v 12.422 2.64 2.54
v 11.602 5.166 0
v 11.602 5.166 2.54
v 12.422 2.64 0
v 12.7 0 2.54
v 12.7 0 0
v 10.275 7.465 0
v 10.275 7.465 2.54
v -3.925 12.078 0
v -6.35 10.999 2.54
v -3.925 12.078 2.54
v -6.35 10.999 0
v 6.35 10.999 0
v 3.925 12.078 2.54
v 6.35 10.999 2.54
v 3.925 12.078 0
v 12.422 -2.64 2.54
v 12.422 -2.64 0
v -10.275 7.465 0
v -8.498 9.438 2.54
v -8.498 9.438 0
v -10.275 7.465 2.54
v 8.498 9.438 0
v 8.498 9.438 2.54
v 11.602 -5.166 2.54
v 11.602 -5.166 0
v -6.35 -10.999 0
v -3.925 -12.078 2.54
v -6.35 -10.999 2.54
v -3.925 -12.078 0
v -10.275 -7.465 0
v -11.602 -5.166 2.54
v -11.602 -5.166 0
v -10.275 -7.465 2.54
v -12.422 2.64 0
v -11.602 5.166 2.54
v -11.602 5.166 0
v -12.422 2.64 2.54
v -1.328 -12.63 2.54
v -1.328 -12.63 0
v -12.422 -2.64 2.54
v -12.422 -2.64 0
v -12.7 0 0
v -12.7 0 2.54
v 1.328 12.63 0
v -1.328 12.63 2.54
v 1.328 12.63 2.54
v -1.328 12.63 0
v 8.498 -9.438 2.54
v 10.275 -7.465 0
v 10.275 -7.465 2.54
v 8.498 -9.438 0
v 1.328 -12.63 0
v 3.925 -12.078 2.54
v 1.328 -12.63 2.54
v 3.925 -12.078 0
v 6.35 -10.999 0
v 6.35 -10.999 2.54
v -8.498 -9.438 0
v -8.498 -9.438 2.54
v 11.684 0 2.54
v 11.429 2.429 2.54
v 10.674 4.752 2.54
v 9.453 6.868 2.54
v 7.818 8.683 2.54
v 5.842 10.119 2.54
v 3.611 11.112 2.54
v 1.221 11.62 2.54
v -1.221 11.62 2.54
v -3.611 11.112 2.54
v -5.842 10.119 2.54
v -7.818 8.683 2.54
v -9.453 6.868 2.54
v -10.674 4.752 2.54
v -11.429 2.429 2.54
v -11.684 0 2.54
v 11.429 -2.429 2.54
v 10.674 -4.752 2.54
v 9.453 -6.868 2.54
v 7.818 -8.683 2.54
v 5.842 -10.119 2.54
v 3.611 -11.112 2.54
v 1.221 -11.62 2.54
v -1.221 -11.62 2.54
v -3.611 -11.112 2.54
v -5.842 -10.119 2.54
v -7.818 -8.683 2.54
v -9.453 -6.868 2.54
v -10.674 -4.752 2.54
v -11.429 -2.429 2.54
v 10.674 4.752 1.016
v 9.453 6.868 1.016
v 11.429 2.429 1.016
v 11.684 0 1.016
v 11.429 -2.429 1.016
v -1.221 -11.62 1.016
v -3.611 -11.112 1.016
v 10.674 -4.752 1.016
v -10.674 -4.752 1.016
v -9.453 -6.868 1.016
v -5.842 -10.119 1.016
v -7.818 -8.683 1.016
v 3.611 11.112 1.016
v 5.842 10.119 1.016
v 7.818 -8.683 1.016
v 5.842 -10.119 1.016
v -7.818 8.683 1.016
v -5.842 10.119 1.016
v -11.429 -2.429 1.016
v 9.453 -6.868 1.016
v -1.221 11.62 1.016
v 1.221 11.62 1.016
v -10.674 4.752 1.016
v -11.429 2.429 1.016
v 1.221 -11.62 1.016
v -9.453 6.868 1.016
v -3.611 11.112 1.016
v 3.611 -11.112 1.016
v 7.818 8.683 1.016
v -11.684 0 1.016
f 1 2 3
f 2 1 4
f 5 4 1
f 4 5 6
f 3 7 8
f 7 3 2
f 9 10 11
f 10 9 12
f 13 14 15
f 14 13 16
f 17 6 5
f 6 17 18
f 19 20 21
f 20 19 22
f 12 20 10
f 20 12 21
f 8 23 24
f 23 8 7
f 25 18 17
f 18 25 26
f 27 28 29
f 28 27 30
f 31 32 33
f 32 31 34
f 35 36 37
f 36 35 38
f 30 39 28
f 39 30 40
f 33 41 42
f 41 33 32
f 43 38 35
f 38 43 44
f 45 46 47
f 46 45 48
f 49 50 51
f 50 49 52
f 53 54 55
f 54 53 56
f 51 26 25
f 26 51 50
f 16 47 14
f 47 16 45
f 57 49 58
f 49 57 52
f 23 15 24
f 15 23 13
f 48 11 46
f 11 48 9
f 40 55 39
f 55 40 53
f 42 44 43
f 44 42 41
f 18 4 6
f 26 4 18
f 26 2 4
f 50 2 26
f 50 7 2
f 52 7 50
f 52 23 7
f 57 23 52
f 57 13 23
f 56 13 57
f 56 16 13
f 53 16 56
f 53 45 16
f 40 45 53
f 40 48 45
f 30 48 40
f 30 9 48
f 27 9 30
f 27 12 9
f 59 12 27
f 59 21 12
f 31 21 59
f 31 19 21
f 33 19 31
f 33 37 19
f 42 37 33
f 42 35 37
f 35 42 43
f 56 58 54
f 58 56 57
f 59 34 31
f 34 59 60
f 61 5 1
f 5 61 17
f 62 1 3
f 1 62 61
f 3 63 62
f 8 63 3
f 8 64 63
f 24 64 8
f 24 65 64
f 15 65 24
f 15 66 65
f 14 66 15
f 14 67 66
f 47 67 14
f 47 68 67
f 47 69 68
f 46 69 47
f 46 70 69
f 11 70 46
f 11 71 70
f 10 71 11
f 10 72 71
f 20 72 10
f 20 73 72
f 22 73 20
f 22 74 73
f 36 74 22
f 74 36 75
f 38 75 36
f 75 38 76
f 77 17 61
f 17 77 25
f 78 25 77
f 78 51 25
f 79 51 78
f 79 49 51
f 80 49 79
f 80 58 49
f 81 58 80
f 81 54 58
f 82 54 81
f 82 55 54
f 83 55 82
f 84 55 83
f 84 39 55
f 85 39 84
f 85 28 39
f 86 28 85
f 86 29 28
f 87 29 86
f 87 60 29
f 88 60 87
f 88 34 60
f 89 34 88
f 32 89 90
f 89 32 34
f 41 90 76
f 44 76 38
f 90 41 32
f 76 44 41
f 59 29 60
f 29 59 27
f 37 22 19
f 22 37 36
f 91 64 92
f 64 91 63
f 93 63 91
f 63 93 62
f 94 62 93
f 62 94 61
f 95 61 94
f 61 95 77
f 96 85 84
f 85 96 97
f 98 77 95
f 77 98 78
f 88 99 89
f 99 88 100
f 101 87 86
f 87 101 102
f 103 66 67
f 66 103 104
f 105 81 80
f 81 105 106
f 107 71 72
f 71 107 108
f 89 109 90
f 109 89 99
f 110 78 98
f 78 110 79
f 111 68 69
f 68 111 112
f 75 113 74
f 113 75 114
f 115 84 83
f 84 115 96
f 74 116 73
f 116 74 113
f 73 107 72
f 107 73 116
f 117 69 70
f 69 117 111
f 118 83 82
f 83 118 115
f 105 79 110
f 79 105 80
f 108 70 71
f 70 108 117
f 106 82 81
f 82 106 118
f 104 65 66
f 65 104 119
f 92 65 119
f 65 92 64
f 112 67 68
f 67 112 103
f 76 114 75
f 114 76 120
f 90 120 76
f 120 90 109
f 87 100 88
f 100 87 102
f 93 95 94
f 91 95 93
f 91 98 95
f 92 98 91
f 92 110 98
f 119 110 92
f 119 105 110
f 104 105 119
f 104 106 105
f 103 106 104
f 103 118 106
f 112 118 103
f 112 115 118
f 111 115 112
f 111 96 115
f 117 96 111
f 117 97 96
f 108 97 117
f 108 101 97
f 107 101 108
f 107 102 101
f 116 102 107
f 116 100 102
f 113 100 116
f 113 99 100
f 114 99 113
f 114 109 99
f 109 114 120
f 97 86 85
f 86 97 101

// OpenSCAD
// OSHW Logo Generator

// render_part=1; // gear_tooth_2d()
// render_part=2; // oshw_logo_2d()
// render_part=3; // 4mm shelled oshw_logo_2d()
render_part=4; // 1 inch OSHW Coin

module gear_tooth_2d(scale=1.0) {
  scale([scale,scale]) polygon(
    points=[ [0,25.0], [90.0,12.0], [90.0,-12.0], [0,-25.0] ]
    , paths=[ [0,1,2,3] ]
    );
}

if(render_part==1) {
  echo("Rendering gear_tooth_2d()...");
  gear_tooth_2d();
}

module oshw_logo_2d(scale=1.0) {
  scale([scale,scale]) rotate(-45-90) {
    difference() {
      union() {
	  circle(r=70.0);
	  for(i=[1:7]) assign(rotAngle=360*i/8+45) rotate(rotAngle) {
	    gear_tooth_2d();
	  }
	}
	circle(r=25.0);
	intersection() {
	  rotate(-20) square(size=[100,100]);
	  rotate(20)  square(size=[100,100]);
	}
    }
  }
}

if(render_part==2) {
  echo("Rendering gear_tooth_2d()...");
  oshw_logo_2d();
}

module shell_2d(width=2.0,steps=8,scale_x=1.0,scale_y=1.0) {
  union() {
    for(i=[0:steps-1]) assign(rotAngle=360*i/steps) difference() {
      child(0);
      translate([scale_x*width*cos(rotAngle),scale_y*width*sin(rotAngle)]) 
	  child(0);
    }
  }
}

if(render_part==3) {
  // Note: Don't perform shell operation on oshw_logo_2d() directly. It's rather inefficient.
  echo("Rendering 4mm shelled gear_tooth_2d()...");
  shell_2d(width=4.0,steps=16,scale_x=1.0,scale_y=1.0)
//    oshw_logo_2d(scale=1.0);
    import(file="ohw-logo.dxf");
}

module oshw_coin(scale=0.1, coin_h=10.0, coin_wall_th=4.0, extension=0.1) {
  scale([scale/200,scale/200,scale/200]) union() {
    difference() {
	cylinder(r=100.0,h=coin_h,center=false);
	translate([0,0,coin_wall_th])
	  cylinder(r=100.0-coin_wall_th,h=coin_h-coin_wall_th+extension,center=false);
	translate([0,0,-extension])  linear_extrude(height=coin_wall_th/2+extension,center=false) 
	  scale([(100.0-coin_wall_th)/100.0,(100.0-coin_wall_th)/100.0]) 
	    shell_2d(width=coin_wall_th,steps=32) import(file="ohw-logo.dxf");
    }
    translate([0,0,coin_wall_th]) color([0,0,1.0]) linear_extrude(height=(coin_h-coin_wall_th)/2,center=false)
	  scale([(100.0-coin_wall_th)/100.0,(100.0-coin_wall_th)/100.0]) import(file="ohw-logo.dxf");
    translate([0,0,coin_wall_th-extension]) color([0,0,0])
	linear_extrude(height=coin_h-coin_wall_th+extension,center=false) scale([(100.0-coin_wall_th)/100.0,(100.0-coin_wall_th)/100.0]) 
	  shell_2d(width=coin_wall_th,steps=32) import(file="ohw-logo.dxf");
  }
}

if(render_part==4) {
  echo("Rendering OSHW Coin scaled to 25.4mm, aka 1 inch...");
  echo("  Note: Colours aren't preserved in the final STL output.");
  oshw_coin(scale=25.4,coin_h=20.0,coin_wall_th=8.0);
}
